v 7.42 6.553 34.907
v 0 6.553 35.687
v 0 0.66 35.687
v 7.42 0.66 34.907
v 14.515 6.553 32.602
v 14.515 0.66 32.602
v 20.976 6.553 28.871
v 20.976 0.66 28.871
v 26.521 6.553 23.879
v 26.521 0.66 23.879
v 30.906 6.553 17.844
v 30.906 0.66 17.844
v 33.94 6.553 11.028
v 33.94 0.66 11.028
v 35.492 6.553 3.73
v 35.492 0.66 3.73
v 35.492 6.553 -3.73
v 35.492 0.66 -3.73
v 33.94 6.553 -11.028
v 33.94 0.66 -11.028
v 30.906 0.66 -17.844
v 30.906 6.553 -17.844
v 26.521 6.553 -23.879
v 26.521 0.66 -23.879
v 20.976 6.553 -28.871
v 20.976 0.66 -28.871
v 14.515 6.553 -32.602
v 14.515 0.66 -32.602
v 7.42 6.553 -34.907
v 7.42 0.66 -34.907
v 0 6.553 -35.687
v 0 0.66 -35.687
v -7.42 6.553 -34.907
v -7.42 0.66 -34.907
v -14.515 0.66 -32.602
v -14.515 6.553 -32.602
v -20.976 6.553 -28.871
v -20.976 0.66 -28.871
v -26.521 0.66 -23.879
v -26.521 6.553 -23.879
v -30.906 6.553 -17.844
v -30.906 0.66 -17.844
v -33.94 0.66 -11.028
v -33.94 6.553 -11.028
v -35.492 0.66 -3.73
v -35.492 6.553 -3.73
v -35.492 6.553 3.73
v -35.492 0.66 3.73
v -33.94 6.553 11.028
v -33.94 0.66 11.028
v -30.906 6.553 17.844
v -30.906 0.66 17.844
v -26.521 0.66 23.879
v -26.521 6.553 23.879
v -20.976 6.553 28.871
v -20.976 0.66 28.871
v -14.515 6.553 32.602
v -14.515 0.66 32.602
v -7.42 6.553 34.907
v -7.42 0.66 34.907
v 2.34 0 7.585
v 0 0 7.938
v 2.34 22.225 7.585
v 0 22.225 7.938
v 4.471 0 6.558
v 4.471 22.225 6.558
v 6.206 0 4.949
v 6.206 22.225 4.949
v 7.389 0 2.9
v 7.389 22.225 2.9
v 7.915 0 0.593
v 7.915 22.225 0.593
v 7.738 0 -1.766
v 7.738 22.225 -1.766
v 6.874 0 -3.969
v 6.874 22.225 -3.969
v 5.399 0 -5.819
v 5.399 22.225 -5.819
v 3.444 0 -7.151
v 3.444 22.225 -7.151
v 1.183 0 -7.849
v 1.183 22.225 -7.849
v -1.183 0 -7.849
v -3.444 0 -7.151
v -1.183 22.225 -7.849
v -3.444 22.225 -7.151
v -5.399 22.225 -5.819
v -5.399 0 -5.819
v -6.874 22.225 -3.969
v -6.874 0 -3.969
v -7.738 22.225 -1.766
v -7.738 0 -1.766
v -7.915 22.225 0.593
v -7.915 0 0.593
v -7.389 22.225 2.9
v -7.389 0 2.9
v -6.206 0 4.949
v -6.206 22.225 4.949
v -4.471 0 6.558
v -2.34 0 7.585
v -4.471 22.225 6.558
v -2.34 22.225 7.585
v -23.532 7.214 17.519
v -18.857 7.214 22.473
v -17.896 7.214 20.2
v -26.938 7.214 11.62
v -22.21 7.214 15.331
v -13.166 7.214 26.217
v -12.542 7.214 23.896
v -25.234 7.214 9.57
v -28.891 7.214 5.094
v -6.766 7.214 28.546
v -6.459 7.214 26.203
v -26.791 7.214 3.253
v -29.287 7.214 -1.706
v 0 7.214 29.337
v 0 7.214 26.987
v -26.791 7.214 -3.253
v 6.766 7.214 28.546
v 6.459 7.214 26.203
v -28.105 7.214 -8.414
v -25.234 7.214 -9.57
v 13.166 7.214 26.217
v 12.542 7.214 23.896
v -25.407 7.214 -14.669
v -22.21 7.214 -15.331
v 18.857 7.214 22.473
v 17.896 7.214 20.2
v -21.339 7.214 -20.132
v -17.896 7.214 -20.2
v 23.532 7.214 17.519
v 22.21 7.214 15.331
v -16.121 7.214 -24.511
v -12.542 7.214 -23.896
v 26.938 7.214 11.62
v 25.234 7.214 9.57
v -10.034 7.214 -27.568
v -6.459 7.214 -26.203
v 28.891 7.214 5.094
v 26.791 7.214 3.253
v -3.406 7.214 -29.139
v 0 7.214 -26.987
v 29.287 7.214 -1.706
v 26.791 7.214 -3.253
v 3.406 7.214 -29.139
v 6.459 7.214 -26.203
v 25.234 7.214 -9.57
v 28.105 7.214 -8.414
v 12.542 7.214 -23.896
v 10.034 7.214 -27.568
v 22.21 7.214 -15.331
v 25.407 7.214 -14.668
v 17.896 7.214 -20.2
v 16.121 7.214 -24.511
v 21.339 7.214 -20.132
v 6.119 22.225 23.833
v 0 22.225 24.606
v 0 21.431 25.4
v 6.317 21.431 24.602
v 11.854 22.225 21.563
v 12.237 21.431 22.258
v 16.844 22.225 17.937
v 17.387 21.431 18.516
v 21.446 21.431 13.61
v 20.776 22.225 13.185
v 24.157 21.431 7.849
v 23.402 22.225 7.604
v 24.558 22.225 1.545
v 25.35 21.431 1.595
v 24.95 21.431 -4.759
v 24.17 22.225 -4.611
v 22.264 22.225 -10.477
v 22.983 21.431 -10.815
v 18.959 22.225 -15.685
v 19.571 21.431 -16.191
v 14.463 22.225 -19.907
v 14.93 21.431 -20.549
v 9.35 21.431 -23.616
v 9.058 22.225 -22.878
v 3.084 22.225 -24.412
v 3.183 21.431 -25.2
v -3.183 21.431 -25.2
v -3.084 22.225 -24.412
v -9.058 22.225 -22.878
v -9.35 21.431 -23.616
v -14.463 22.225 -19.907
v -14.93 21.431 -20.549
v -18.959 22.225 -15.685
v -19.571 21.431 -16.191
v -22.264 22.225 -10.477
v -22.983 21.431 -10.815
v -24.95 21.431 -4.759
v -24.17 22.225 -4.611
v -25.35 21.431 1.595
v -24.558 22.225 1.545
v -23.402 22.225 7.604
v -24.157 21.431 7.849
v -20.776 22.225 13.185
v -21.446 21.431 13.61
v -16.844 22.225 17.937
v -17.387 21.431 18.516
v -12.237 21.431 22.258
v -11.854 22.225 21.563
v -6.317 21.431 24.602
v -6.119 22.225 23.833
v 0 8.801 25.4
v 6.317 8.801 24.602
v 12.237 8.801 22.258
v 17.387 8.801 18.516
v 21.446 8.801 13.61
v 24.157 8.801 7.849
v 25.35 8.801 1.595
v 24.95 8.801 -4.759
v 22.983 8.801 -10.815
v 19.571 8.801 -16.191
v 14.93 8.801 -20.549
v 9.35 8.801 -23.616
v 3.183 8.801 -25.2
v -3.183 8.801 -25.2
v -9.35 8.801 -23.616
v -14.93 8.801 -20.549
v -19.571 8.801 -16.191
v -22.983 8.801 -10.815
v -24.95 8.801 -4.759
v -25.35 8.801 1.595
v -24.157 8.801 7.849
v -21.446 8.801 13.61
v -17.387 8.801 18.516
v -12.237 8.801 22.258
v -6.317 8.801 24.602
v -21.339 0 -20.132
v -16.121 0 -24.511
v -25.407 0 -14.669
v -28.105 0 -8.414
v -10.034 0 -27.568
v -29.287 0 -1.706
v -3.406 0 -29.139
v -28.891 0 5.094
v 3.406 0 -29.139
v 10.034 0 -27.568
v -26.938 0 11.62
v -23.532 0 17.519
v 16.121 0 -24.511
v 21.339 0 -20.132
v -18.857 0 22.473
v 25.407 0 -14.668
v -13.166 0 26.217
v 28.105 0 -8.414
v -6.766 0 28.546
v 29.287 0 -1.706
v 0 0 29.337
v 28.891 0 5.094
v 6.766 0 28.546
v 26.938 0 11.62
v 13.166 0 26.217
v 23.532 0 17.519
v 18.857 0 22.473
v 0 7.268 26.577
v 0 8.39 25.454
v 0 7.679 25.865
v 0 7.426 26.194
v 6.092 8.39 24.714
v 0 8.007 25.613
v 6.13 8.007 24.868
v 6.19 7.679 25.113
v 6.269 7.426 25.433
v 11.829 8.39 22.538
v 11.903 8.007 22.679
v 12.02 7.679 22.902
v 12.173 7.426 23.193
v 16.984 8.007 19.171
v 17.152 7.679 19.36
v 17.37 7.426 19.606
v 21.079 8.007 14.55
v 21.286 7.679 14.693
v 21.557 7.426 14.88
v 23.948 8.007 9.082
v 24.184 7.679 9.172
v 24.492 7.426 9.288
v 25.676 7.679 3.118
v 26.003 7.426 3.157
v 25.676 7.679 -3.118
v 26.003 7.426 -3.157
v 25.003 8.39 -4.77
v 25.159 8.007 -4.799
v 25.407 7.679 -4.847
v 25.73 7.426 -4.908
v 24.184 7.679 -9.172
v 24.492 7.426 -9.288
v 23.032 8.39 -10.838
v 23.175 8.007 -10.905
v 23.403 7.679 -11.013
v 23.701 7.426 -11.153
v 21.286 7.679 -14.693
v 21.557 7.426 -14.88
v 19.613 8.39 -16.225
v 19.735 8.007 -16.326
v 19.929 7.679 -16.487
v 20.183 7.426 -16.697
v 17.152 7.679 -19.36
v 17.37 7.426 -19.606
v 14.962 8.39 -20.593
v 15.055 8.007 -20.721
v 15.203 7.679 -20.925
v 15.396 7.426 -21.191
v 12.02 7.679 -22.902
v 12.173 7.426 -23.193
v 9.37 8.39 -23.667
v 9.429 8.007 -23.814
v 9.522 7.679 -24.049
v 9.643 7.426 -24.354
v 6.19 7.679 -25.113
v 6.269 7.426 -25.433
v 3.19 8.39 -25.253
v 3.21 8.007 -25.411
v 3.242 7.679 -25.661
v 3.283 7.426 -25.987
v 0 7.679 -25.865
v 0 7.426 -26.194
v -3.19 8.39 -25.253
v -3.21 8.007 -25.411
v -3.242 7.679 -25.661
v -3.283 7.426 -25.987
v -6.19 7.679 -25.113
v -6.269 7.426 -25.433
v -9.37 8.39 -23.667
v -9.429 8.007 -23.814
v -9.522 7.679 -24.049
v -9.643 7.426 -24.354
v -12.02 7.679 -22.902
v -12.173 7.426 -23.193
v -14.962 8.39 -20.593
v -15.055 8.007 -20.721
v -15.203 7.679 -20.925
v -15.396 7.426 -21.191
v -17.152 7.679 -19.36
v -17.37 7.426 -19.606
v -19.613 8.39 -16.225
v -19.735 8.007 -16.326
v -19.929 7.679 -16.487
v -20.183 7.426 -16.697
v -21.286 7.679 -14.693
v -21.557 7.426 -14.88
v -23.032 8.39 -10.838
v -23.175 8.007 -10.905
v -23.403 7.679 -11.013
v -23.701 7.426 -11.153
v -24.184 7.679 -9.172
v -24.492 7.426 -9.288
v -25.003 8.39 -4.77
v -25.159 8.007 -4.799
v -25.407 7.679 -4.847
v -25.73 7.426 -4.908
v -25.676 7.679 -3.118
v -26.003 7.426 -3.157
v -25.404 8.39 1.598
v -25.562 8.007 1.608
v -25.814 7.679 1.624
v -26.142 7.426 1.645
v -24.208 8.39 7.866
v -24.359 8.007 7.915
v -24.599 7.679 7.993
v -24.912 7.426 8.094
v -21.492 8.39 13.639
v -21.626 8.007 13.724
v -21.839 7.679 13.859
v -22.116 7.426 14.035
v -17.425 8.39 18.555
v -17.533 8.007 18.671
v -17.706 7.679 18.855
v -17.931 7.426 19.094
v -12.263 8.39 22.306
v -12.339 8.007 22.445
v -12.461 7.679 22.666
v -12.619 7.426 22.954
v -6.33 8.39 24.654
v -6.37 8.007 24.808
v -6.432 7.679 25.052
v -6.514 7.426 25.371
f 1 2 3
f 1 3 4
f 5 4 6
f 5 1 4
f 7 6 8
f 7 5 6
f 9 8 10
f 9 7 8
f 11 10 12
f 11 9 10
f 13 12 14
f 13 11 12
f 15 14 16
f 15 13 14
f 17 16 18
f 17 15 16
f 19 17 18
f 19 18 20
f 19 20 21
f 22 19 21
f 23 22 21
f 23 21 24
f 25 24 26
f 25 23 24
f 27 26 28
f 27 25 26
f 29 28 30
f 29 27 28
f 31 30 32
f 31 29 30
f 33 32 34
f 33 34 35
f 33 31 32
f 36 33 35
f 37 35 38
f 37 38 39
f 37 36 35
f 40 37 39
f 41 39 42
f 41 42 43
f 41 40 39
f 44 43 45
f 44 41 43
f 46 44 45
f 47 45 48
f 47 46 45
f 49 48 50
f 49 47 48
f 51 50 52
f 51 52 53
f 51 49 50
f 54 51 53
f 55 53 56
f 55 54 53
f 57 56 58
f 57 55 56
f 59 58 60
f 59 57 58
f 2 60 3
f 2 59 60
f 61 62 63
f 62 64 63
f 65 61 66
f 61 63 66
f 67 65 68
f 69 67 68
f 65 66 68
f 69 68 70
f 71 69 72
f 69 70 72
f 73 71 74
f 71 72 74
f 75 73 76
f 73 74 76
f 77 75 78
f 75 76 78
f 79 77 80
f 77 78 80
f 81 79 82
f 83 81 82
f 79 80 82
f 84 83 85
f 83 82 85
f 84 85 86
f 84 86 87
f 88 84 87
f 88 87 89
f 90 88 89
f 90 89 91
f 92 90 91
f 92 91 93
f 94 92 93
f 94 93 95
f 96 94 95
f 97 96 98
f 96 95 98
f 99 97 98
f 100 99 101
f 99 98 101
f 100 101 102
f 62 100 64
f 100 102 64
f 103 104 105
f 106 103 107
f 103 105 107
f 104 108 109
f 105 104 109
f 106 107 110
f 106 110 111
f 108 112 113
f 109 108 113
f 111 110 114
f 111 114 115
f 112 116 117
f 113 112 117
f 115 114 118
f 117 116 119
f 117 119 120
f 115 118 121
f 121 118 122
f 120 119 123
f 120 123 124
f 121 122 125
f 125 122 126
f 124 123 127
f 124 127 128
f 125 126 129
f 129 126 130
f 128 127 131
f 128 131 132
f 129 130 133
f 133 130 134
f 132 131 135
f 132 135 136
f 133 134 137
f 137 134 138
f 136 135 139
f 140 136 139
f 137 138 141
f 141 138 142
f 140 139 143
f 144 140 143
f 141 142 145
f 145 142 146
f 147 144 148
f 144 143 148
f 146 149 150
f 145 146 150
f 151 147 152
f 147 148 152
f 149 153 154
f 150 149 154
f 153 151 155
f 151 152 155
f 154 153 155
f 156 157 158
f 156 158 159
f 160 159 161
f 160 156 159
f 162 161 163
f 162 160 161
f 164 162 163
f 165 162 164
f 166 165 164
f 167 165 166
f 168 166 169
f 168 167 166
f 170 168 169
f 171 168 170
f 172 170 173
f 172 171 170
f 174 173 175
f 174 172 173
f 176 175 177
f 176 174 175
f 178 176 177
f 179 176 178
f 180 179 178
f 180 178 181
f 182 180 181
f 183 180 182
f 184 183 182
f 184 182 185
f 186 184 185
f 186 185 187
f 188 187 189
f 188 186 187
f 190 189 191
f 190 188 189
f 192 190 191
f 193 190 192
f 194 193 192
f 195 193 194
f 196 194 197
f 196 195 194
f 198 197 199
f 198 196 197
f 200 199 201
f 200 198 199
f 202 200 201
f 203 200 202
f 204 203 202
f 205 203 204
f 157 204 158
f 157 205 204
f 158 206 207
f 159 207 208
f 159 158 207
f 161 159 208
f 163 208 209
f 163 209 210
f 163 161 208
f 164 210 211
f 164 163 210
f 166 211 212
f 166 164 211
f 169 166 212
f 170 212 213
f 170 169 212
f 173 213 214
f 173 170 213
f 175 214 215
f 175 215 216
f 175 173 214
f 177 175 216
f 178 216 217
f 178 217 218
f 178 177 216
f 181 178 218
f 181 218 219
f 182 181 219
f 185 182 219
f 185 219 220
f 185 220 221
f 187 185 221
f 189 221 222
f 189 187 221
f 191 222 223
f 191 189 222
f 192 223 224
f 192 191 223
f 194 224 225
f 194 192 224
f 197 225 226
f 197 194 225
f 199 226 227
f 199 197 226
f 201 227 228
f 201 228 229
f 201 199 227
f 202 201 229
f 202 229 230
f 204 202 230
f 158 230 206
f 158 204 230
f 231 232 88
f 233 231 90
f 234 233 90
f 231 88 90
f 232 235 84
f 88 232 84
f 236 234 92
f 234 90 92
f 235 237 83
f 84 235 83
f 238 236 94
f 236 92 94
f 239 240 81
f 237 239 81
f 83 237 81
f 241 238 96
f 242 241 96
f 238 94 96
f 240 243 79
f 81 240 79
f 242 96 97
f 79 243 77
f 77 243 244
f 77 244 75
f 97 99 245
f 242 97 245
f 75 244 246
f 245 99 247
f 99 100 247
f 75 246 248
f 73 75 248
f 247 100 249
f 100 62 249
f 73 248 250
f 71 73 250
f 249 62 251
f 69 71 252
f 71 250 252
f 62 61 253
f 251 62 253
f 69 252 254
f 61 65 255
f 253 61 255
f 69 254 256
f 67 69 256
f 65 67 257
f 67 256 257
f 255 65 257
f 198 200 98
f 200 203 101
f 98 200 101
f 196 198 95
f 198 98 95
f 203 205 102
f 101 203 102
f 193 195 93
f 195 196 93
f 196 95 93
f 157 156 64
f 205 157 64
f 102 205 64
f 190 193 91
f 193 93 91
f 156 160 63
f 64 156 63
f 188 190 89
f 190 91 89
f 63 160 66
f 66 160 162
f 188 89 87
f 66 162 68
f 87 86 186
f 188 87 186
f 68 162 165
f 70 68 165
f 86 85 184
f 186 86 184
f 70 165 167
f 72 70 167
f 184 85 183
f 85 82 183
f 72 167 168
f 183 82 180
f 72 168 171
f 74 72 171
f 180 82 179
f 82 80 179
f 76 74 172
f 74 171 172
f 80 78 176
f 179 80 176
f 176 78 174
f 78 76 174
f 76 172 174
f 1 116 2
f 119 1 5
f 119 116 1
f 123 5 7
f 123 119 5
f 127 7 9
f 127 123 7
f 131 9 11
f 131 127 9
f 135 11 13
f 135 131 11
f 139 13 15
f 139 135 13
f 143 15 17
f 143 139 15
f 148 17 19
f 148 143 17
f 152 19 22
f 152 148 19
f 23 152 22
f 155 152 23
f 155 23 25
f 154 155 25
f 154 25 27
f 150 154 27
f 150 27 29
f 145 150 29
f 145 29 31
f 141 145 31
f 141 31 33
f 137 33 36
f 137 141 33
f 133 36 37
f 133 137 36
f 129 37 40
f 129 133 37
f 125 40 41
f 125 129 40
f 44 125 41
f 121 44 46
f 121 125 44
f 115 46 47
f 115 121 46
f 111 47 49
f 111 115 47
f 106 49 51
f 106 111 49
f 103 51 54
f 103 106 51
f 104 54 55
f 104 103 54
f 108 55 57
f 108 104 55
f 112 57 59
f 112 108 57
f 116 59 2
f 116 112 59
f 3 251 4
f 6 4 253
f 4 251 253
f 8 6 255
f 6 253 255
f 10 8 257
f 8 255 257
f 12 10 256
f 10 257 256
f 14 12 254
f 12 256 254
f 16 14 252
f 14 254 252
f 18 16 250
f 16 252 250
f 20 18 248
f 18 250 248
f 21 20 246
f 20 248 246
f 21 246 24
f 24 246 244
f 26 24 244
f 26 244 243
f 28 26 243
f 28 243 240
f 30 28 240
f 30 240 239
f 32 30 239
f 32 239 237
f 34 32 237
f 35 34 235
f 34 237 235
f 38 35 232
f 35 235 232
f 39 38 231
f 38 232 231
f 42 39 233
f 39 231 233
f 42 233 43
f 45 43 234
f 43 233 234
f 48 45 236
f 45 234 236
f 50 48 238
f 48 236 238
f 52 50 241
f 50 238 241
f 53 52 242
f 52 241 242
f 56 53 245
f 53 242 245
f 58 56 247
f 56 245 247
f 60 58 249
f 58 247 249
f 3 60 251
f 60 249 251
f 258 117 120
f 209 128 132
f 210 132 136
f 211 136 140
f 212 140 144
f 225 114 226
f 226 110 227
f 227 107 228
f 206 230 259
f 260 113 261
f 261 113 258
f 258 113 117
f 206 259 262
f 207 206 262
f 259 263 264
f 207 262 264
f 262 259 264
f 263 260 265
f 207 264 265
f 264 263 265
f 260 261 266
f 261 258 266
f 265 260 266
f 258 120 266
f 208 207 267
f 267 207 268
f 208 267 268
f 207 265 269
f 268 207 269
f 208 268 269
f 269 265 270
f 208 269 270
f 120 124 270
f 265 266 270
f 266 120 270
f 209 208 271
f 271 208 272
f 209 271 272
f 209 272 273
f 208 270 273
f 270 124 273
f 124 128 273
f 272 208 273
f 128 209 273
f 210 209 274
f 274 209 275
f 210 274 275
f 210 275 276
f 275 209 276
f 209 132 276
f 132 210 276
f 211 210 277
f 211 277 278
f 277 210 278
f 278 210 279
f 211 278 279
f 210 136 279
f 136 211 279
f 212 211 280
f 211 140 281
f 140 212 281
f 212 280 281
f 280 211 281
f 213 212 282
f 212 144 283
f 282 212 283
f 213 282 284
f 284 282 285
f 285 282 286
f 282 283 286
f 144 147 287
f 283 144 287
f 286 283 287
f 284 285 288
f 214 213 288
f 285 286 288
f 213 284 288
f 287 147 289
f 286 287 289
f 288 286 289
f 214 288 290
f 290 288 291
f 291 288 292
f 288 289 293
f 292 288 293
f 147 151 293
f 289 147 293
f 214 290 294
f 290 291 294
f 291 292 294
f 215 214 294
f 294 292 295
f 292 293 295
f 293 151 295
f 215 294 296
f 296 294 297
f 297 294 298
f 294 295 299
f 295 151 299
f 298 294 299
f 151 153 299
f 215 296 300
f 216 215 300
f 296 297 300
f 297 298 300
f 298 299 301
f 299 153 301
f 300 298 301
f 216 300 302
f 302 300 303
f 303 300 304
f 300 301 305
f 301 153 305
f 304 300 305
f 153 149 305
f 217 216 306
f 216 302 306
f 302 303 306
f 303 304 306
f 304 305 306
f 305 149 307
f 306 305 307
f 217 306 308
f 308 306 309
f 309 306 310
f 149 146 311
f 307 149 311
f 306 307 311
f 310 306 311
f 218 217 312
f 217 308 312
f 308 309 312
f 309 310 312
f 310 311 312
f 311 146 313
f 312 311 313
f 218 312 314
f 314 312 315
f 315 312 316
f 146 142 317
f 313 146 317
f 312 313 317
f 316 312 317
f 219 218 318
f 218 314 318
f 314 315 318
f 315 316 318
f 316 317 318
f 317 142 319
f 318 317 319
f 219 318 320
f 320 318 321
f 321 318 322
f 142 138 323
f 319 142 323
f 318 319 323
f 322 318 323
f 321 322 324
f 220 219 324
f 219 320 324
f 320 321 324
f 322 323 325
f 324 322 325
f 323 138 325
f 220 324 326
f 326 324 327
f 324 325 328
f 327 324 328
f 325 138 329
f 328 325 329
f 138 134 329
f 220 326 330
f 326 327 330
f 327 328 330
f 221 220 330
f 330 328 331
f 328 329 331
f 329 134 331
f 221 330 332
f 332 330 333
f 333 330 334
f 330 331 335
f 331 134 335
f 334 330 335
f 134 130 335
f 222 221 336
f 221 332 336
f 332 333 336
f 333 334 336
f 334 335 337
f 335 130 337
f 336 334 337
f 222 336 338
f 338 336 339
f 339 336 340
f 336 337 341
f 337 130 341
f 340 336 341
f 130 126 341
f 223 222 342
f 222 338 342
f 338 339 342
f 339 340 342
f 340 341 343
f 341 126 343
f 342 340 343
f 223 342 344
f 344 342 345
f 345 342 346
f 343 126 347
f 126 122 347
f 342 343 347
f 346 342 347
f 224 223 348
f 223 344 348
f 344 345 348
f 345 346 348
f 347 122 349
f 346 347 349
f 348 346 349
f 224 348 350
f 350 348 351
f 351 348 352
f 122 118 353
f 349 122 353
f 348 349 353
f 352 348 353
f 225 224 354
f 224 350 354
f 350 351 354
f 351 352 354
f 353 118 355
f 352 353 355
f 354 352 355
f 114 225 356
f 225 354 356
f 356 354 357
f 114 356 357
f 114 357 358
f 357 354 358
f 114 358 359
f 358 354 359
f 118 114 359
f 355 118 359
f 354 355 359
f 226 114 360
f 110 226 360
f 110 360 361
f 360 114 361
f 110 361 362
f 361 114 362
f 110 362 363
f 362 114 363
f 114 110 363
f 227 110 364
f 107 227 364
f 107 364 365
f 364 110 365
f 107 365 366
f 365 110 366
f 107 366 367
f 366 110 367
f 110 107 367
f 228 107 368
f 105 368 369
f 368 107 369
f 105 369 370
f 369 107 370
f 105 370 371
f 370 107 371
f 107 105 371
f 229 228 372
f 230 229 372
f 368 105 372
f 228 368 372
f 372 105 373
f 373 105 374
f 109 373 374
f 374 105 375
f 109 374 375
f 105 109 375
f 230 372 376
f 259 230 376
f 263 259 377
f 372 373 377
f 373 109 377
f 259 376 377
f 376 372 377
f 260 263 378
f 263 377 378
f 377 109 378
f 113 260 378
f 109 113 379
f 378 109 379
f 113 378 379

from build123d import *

# Parameters (mm, degrees)
F0_W     = 15.0114
F0_H     = 17.4625
F0_W_2   = 7.2136
F0_H_2   = 10.287
F2_R     = 1.5875
F3_SIZE  = 0.79375
F4_SIZE2 = 6.35
F4_SIZE  = 0.6604


with BuildPart() as f1:
    # F0 (on Right) → F1 (revolve)
    with BuildSketch(Plane.YZ):
        with Locations((14.7193, 16.66875)):
            Rectangle(F0_W, F0_H)
        with Locations((3.6068, 30.5435)):
            Rectangle(F0_W_2, F0_H_2)
        with Locations((3.6068, 16.66875)):
            Rectangle(F0_W_2, F0_H)
    revolve(axis=Axis((0, 11.1125, 0), (0, 1, 0)))

    # F2
    f2_edges = [f1.edges().sort_by_distance(p)[0] for p in [
        (0, 7.2136, -25.4),
    ]]
    fillet(f2_edges, radius=F2_R)

    # F3
    f3_edges = [f1.edges().sort_by_distance(p)[0] for p in [
        (0, 22.225, -25.4),
    ]]
    chamfer(f3_edges, length=F3_SIZE)

    # F4
    f4_edges = [f1.edges().sort_by_distance(p)[0] for p in [
        (0, 0, -35.687),
        (0, 7.2136, -35.687),
    ]]
    f4_side = f1.faces().sort_by_distance((0, 3.6068, -35.687))[0]
    chamfer(f4_edges, length=F4_SIZE, length2=F4_SIZE2, reference=f4_side)


solid = f1.part
